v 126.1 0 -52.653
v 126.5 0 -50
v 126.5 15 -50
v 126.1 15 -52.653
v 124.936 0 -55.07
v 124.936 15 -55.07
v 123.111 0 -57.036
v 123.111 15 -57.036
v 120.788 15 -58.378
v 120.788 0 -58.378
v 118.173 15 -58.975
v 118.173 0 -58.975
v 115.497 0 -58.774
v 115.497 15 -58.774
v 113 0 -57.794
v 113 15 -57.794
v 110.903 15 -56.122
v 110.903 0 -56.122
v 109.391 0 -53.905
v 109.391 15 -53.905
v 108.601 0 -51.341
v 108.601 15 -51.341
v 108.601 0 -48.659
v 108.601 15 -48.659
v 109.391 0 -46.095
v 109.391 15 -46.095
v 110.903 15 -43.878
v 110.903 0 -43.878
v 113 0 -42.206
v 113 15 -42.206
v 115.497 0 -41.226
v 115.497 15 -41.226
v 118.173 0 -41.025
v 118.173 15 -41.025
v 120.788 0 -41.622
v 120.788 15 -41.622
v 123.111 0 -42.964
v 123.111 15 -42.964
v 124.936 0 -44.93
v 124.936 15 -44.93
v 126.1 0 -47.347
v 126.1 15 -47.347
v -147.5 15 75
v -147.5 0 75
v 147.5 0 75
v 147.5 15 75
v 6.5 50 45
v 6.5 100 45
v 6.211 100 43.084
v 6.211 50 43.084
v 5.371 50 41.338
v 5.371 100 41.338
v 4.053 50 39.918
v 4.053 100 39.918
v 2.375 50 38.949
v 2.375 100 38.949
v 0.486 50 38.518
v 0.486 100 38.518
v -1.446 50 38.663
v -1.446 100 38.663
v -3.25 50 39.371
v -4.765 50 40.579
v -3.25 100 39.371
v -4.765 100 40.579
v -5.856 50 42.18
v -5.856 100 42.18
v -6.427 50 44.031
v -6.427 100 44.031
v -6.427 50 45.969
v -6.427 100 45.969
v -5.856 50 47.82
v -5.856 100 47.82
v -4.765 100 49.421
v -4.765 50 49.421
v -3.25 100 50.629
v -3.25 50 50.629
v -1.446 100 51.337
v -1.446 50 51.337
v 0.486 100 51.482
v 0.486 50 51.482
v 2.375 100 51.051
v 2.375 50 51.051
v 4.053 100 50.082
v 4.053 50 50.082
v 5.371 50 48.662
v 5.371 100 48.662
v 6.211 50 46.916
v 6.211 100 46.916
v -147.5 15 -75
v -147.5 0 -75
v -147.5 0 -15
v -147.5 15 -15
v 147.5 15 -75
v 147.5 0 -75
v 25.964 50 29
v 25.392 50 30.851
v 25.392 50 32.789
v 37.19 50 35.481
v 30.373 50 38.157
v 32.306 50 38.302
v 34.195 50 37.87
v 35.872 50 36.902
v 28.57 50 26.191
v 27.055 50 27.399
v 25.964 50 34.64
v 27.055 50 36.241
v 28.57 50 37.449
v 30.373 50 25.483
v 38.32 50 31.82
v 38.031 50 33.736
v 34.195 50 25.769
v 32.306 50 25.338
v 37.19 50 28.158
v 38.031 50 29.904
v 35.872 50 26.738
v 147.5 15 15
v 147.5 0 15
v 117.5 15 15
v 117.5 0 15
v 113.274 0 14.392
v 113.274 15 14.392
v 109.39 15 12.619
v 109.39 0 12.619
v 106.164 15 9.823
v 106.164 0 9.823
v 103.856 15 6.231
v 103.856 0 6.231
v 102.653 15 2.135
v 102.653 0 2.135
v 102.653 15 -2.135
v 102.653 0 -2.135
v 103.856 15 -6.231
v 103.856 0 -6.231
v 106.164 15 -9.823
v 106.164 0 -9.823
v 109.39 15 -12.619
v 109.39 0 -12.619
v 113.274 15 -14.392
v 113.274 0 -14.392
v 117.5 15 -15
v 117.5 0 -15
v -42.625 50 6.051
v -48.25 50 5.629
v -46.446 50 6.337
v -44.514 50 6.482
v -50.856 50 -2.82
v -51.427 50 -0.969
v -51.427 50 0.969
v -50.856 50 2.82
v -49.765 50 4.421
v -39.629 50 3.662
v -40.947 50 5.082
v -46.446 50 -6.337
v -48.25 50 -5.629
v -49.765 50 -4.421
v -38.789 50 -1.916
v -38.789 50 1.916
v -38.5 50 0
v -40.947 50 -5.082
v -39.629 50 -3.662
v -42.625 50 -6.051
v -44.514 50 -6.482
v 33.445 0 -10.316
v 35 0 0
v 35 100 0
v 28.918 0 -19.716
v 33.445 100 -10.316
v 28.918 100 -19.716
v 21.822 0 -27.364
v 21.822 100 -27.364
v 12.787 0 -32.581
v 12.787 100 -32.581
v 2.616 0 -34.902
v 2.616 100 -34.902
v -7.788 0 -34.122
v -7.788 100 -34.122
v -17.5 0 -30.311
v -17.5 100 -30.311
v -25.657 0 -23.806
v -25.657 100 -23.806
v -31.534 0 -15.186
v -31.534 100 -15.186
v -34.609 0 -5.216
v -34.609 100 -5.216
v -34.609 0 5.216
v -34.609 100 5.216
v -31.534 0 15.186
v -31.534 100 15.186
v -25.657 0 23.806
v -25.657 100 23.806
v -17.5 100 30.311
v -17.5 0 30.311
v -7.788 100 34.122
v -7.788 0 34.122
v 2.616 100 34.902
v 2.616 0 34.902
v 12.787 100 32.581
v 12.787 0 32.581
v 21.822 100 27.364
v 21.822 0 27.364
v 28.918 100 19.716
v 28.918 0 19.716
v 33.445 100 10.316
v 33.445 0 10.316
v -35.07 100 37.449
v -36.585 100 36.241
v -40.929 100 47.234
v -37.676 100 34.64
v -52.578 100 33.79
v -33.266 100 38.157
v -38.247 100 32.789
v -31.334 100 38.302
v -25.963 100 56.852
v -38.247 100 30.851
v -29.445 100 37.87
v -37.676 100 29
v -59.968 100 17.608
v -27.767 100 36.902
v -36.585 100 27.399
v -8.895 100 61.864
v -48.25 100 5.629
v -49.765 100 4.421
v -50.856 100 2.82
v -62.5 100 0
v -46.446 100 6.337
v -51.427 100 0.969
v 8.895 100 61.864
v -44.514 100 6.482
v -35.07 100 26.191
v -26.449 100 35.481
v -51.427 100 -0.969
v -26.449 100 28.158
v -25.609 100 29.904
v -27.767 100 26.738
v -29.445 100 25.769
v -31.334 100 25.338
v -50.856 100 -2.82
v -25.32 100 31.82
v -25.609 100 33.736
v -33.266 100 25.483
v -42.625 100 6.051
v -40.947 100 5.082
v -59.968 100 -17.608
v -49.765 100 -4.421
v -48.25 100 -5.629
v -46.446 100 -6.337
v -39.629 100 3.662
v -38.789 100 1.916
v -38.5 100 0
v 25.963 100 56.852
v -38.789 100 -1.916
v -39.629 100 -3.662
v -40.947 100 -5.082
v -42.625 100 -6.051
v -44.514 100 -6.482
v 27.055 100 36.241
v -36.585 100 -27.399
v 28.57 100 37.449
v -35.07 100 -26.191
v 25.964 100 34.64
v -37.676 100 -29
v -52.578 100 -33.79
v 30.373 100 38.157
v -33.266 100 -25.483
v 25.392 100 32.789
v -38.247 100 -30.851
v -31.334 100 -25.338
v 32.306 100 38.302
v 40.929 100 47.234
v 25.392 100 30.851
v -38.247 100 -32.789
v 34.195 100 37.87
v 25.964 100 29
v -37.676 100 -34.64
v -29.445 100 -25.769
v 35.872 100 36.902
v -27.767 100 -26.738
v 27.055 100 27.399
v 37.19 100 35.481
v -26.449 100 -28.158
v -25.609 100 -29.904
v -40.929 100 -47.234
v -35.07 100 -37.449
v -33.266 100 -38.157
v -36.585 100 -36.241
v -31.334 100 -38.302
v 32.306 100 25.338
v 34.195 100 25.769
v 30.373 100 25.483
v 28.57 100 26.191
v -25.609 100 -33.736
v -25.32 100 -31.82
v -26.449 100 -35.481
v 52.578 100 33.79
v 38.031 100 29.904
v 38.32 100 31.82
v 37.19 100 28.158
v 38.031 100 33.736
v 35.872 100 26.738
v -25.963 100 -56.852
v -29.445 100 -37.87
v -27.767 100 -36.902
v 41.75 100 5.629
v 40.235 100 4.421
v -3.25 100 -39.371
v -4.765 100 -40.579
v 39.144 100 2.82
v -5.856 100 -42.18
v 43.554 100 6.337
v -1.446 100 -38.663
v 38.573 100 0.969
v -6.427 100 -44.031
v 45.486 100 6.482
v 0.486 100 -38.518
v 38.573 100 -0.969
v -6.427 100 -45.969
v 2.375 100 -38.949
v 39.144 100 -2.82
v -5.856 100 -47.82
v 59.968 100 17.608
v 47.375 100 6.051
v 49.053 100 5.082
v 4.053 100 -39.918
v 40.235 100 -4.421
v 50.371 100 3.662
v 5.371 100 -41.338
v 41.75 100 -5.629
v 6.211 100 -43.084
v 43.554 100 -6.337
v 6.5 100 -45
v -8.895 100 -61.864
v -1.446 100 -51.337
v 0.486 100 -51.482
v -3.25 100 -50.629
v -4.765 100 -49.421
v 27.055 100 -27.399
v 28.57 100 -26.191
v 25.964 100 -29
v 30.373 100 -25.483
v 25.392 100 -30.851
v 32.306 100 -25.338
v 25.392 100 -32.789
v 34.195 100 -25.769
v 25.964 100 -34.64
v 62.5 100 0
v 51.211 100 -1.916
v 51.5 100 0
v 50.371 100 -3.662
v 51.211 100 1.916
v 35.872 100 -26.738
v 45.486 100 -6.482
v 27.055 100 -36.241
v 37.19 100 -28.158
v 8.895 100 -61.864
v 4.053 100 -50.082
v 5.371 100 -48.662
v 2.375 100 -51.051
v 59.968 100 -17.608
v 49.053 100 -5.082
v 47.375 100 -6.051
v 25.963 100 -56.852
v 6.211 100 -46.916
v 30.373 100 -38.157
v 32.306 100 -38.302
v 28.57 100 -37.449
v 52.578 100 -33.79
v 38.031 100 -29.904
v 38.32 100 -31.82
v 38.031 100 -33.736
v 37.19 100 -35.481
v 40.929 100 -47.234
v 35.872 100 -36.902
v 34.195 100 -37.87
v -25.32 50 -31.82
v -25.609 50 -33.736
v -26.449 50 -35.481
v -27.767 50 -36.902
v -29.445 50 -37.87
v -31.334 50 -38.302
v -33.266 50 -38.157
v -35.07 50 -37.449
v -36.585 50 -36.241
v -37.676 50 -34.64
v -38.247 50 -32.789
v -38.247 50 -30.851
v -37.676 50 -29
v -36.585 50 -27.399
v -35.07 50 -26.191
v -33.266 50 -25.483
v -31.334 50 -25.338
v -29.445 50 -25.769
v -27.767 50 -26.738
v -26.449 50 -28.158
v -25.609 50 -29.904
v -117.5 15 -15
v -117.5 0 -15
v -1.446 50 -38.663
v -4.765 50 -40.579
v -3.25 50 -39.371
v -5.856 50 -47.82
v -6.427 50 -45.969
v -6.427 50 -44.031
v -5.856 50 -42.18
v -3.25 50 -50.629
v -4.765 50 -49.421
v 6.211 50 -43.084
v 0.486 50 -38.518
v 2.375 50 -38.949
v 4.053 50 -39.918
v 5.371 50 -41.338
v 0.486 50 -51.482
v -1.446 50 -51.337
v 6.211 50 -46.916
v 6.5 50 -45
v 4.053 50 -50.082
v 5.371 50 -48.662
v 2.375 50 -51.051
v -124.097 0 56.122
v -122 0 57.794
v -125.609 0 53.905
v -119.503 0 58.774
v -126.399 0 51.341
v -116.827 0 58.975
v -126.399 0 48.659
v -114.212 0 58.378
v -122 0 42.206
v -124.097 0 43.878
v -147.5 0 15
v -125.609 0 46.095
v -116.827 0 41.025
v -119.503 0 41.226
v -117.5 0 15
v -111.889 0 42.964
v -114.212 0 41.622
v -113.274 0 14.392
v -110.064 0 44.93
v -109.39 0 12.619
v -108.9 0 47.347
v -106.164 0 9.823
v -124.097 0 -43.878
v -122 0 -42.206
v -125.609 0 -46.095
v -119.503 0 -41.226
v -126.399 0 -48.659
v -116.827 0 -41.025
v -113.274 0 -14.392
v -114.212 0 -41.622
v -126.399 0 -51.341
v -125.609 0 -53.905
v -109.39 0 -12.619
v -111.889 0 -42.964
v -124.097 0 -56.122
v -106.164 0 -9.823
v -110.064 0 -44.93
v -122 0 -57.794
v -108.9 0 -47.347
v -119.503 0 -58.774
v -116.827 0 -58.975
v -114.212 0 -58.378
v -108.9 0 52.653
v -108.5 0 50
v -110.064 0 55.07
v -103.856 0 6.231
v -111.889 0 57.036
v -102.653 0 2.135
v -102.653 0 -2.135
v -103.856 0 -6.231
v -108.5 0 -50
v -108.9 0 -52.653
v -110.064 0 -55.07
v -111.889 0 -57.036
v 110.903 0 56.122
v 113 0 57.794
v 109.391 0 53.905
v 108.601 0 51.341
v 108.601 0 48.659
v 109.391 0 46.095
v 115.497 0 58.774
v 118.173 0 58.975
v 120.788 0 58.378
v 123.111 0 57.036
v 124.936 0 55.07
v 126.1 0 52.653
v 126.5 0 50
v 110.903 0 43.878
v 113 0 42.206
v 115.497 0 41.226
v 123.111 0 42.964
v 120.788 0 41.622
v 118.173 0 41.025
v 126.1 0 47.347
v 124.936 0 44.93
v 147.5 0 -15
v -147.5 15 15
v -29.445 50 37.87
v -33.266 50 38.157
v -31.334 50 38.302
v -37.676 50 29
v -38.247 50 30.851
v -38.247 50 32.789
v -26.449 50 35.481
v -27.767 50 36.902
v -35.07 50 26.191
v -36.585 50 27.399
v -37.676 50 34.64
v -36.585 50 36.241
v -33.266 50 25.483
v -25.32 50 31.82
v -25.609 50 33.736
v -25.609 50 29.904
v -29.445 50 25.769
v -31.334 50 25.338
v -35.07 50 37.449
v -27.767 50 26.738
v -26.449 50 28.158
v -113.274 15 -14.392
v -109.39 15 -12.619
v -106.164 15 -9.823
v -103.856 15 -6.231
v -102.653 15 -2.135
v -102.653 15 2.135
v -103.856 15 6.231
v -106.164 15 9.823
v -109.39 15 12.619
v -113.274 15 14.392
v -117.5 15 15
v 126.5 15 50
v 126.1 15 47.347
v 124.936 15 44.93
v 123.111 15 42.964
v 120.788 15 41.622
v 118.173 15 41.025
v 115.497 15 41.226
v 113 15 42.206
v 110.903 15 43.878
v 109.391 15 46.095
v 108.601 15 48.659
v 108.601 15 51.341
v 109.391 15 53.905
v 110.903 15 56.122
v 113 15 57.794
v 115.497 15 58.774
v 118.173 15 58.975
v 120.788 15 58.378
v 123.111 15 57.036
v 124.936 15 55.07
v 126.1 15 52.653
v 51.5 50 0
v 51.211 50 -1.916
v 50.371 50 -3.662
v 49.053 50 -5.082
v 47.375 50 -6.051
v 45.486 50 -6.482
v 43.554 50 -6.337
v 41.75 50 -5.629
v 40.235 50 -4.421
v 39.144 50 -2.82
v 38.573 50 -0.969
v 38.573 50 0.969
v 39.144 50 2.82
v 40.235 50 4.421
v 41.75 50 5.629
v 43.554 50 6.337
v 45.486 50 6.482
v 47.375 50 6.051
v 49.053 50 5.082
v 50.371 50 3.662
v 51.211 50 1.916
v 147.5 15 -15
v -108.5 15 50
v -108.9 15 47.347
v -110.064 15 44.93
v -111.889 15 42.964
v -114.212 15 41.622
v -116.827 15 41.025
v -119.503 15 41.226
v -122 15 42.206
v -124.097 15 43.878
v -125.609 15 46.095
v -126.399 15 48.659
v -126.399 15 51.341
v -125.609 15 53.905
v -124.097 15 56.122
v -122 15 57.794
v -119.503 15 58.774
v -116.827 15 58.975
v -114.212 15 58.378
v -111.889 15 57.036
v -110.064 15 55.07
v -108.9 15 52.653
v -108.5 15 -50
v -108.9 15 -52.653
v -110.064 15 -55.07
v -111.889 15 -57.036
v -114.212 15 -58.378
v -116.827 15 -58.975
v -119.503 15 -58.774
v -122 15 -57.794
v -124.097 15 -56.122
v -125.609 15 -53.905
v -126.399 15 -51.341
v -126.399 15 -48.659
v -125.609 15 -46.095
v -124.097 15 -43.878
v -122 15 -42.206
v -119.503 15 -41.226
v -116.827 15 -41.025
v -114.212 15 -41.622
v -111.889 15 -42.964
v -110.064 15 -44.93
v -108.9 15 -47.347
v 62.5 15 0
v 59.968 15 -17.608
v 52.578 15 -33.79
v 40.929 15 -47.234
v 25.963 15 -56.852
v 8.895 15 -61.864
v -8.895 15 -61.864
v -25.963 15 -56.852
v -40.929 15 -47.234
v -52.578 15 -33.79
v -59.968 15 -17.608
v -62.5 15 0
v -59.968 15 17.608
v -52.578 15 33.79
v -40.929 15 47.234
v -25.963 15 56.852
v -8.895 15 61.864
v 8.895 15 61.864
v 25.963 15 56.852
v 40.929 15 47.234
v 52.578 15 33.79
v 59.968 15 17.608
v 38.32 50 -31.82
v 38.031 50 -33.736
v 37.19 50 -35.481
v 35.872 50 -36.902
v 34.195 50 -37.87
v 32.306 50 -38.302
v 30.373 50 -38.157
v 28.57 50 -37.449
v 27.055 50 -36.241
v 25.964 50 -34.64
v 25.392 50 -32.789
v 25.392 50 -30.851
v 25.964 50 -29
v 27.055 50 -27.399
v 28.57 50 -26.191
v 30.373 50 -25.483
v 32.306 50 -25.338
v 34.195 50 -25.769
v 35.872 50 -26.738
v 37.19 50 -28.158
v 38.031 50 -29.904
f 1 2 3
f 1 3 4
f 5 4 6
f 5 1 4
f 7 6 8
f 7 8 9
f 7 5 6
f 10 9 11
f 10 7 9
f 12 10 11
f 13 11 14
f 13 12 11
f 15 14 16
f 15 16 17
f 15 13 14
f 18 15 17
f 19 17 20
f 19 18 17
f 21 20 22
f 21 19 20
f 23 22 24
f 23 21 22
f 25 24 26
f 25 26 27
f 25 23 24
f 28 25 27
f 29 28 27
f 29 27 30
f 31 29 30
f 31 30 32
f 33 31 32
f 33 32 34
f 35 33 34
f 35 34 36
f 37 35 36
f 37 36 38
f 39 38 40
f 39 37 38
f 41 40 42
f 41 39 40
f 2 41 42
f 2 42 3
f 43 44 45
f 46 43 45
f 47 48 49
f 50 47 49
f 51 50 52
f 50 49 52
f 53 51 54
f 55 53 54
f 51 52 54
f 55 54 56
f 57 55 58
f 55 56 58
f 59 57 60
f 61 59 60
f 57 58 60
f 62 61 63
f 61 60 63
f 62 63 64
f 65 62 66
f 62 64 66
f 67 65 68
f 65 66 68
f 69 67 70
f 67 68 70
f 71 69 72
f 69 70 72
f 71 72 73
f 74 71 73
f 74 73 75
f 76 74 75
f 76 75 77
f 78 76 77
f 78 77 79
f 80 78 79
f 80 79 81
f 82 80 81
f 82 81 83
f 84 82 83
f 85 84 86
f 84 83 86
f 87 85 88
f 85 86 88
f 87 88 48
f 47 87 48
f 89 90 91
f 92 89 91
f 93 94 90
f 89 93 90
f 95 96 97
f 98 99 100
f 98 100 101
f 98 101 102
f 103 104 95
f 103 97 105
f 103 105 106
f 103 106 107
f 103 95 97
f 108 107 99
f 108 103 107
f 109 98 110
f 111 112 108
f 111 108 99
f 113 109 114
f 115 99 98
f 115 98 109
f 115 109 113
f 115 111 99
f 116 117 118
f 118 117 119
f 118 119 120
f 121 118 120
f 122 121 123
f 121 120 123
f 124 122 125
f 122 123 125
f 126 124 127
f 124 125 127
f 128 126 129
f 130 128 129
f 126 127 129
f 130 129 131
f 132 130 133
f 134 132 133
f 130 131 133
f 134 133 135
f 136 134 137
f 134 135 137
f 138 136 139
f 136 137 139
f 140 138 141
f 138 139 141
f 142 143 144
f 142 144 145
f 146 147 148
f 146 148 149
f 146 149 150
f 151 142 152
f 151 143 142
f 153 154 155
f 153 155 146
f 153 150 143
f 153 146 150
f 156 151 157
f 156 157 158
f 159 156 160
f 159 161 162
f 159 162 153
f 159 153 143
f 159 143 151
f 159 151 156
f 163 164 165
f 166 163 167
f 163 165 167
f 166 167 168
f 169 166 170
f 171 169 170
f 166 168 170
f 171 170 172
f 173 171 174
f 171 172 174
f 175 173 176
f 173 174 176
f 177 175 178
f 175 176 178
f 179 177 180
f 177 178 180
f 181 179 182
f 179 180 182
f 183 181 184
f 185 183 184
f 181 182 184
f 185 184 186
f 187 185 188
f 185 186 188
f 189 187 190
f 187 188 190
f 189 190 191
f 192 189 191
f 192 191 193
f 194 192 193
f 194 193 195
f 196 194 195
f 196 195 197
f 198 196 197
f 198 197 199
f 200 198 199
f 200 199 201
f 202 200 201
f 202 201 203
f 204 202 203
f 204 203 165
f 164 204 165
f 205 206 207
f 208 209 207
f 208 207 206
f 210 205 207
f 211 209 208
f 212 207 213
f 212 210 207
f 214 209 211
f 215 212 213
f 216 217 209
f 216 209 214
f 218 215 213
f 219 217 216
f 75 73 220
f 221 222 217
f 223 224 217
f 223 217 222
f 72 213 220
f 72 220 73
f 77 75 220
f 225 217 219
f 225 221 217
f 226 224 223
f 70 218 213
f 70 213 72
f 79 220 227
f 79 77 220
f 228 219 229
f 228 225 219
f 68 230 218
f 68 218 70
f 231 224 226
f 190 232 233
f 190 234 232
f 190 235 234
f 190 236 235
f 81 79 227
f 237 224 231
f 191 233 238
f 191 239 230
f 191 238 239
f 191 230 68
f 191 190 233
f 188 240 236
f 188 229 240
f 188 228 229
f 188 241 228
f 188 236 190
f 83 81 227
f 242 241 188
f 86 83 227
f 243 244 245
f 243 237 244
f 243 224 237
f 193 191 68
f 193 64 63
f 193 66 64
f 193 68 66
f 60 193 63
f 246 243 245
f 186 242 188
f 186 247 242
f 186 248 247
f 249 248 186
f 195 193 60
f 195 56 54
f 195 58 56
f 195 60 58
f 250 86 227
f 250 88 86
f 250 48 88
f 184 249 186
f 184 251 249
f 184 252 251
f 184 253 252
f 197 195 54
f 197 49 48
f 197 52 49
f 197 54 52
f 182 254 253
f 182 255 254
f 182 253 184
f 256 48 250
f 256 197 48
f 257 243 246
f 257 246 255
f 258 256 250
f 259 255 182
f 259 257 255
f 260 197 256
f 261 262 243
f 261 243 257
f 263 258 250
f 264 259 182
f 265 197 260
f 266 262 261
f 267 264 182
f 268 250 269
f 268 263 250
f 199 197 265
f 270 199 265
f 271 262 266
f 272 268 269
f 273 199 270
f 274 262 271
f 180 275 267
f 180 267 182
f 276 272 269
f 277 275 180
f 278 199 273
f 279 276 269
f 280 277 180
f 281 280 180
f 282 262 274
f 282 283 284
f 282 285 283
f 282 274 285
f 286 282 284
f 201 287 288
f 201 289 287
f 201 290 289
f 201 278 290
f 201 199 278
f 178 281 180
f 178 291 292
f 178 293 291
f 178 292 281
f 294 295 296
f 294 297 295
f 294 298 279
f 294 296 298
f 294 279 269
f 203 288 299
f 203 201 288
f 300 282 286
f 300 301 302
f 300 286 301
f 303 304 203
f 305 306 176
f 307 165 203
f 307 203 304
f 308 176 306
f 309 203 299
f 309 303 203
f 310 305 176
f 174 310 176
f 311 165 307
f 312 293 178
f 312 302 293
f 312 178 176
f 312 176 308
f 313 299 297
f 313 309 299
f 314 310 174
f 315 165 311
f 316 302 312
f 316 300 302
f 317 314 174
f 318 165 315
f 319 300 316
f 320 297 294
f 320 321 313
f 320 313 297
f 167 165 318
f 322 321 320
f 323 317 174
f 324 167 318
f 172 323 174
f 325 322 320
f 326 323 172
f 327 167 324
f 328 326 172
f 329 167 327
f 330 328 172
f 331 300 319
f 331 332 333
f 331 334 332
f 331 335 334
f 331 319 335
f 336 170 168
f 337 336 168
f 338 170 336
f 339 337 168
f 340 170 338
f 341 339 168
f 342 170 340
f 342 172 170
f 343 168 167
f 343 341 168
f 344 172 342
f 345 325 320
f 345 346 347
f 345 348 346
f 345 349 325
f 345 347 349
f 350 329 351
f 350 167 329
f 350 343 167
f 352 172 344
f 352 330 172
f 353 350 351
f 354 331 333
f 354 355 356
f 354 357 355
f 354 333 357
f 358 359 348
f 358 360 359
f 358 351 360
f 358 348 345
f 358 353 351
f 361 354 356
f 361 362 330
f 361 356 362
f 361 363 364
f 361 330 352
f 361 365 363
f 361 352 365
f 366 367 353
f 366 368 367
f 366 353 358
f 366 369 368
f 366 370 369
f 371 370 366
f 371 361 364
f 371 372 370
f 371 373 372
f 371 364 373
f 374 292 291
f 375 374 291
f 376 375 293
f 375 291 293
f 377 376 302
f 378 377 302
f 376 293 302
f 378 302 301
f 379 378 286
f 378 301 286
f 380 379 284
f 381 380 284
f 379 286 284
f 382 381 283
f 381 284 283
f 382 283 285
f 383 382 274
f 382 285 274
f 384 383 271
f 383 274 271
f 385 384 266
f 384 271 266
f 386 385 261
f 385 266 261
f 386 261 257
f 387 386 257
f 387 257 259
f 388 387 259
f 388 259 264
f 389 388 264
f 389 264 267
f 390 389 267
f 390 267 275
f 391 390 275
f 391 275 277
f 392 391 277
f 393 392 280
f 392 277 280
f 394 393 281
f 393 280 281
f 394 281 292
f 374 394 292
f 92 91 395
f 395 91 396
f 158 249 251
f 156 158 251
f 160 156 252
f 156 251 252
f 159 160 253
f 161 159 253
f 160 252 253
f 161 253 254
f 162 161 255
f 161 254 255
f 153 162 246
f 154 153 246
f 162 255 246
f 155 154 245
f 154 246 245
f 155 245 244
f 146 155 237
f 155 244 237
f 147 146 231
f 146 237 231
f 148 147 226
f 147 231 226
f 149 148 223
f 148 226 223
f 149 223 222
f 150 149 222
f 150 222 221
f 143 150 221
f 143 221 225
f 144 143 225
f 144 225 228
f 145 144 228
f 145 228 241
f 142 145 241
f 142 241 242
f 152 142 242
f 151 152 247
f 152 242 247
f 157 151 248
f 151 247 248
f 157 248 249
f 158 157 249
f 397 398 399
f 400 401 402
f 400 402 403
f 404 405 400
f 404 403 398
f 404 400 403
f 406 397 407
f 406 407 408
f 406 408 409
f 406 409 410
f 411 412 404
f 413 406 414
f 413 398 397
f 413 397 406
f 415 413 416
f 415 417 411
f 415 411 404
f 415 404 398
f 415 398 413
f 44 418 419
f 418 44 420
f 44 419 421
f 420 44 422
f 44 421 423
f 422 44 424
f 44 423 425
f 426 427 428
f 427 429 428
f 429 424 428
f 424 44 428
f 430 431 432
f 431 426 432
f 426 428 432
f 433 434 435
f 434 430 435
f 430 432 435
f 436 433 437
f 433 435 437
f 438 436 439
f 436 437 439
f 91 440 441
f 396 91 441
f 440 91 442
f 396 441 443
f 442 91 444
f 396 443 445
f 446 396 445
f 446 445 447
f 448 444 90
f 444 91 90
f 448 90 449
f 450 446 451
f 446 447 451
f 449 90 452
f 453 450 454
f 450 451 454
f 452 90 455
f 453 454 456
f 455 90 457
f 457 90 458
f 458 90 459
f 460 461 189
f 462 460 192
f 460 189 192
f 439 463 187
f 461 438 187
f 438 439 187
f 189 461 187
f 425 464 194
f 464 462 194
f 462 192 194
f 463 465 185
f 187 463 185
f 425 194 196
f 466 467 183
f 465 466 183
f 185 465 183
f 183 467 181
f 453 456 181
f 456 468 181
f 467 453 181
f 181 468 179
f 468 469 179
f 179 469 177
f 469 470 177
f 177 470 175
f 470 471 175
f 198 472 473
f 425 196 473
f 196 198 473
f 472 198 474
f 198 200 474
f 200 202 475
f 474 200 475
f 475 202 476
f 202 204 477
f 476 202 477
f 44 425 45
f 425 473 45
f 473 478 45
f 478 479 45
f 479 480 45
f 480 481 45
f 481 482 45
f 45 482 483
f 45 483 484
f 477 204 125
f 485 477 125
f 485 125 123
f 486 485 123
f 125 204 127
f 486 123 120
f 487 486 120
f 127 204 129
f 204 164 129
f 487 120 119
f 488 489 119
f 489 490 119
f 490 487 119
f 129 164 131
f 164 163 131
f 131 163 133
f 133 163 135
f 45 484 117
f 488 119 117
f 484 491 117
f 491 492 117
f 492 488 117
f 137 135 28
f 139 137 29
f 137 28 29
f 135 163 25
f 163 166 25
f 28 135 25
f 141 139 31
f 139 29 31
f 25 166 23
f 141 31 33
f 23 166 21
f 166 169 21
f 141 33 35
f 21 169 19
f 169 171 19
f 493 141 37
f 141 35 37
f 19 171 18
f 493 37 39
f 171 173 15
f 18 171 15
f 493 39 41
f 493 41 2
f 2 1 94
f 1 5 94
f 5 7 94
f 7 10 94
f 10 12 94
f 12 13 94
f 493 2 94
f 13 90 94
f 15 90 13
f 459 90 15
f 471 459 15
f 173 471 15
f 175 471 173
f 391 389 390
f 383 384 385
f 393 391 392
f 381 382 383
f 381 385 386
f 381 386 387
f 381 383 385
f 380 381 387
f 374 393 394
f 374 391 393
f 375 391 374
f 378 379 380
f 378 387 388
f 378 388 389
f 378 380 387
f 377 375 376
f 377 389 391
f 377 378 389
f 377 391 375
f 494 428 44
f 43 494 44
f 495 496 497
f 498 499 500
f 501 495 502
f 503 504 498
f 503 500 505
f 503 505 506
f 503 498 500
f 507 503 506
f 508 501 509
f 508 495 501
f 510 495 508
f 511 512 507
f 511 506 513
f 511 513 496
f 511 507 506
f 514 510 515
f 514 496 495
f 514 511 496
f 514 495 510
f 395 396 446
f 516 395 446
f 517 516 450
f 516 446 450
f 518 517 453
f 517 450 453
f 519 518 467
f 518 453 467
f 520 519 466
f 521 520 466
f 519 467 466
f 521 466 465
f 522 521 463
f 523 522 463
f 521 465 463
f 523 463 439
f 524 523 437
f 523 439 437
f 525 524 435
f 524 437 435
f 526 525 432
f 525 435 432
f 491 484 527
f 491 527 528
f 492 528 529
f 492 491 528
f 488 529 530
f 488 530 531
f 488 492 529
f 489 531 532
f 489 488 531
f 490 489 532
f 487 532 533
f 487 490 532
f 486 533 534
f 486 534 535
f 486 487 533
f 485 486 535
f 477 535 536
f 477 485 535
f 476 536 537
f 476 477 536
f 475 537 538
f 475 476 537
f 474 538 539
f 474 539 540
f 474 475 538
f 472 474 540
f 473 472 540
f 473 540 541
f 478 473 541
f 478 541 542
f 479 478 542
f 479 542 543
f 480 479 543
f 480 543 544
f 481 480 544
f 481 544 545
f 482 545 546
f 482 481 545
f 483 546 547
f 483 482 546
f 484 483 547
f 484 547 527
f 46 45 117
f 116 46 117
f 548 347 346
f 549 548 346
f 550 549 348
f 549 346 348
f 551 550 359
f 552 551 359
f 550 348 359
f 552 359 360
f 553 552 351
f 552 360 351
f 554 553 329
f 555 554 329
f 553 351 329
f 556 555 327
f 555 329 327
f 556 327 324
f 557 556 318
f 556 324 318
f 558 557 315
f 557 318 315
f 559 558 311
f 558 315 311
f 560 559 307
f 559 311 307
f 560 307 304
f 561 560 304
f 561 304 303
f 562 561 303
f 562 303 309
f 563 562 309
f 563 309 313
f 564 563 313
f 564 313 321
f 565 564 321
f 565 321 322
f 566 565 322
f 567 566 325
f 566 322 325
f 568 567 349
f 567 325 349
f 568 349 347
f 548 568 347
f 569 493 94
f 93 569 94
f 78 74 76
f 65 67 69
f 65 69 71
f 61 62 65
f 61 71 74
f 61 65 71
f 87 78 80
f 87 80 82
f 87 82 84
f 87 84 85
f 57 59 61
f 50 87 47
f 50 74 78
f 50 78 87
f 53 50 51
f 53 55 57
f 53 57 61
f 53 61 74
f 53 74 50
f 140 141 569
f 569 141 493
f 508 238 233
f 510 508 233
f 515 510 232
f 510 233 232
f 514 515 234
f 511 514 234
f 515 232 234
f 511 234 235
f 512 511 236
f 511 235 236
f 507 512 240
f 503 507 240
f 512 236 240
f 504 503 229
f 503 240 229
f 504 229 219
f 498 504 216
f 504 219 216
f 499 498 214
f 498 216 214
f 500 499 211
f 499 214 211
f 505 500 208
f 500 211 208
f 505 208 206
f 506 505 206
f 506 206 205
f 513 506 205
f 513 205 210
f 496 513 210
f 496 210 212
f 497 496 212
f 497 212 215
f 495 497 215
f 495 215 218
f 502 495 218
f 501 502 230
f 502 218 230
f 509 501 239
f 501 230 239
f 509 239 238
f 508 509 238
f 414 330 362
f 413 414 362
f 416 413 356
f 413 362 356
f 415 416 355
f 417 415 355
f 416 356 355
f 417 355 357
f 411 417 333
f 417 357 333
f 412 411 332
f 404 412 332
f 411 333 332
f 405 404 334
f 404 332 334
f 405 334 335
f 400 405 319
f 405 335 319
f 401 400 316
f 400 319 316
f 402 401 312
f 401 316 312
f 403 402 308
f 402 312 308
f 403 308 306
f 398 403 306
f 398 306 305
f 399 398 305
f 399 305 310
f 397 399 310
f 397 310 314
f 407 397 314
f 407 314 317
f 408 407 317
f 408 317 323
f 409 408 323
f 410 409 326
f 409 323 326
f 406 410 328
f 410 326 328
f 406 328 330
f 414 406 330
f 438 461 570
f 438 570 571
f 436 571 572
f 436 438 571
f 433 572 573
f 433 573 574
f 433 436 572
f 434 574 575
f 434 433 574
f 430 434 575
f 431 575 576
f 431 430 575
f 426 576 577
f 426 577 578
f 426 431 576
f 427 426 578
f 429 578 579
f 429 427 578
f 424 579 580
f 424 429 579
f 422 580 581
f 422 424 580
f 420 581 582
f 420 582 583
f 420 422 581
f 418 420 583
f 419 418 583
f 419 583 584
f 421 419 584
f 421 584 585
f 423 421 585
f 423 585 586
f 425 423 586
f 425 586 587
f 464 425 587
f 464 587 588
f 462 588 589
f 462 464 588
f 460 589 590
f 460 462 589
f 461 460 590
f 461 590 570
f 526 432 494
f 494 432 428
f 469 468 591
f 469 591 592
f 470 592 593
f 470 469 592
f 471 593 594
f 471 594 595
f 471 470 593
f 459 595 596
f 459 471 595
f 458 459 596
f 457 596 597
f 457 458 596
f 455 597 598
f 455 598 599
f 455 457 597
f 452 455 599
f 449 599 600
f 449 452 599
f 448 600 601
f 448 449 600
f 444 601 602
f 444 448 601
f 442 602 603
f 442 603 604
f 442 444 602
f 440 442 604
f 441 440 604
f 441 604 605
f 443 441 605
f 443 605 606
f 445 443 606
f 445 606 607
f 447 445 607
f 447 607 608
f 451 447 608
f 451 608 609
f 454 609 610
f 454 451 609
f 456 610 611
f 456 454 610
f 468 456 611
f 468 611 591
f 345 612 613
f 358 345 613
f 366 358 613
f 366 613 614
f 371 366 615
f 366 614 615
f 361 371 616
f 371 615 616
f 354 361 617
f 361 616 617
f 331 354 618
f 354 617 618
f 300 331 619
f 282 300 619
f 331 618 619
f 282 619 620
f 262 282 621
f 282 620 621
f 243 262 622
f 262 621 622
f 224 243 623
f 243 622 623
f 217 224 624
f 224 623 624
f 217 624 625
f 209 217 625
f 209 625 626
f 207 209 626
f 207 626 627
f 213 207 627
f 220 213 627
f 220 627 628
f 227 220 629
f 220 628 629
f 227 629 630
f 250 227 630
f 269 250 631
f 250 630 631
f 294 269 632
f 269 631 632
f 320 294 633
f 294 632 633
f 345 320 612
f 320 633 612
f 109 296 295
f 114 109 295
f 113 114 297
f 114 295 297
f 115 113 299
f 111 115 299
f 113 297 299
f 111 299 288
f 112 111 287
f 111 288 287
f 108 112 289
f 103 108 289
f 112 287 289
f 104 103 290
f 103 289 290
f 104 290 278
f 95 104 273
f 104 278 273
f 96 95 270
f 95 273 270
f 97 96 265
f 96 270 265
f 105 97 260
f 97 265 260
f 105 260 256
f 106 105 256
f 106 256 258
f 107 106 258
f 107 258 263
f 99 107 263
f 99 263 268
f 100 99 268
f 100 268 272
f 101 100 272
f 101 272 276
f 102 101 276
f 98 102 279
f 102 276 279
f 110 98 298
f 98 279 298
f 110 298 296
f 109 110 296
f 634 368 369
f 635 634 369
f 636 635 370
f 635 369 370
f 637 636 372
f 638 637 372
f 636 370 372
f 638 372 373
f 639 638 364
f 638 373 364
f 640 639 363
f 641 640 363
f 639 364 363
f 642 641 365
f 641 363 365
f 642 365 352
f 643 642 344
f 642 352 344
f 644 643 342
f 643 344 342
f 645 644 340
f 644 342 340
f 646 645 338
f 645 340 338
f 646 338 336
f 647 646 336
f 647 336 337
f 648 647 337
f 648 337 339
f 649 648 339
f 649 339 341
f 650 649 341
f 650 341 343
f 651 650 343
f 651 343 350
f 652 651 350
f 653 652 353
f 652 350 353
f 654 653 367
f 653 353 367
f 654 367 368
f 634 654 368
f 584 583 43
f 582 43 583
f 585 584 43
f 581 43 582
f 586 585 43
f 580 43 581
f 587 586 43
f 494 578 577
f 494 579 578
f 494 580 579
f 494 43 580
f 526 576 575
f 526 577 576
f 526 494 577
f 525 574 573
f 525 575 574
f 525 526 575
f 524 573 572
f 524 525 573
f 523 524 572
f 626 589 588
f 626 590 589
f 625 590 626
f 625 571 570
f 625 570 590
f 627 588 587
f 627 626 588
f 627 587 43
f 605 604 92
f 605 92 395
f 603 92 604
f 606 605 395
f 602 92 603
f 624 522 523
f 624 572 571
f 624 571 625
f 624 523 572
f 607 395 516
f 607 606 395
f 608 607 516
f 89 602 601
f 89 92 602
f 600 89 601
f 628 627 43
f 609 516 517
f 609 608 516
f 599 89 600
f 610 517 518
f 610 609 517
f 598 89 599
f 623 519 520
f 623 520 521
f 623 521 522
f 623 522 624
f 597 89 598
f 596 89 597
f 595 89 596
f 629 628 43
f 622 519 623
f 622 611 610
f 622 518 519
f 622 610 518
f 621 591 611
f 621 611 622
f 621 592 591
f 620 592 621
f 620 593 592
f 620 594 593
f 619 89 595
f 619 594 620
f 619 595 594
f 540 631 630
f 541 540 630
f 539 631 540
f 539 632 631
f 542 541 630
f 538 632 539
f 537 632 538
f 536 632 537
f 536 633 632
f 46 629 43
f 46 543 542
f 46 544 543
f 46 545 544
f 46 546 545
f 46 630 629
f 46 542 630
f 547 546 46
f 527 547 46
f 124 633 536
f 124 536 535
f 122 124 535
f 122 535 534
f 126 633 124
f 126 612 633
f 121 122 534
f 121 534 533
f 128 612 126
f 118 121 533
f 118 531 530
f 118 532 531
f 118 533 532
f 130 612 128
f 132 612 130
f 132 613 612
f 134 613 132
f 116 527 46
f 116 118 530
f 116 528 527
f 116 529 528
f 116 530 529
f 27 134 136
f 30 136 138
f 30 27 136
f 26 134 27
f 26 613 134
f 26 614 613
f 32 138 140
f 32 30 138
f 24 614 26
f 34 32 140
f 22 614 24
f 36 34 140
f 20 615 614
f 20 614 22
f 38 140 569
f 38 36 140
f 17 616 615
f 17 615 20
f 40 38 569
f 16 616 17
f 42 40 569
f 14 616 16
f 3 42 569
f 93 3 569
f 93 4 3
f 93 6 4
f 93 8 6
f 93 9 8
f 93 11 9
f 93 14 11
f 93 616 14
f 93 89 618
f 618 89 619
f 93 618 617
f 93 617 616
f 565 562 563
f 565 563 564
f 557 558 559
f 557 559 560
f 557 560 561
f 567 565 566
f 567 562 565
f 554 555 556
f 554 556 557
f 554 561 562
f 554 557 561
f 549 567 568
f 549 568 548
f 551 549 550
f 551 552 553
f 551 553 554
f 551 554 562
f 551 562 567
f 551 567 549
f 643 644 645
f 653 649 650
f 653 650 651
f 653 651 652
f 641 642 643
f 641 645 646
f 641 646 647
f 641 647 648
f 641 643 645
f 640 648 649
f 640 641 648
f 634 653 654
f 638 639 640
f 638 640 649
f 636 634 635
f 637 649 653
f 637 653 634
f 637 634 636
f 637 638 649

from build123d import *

# Parameters (mm, degrees)
SKETCH1_R           = 9
BOSS_EXTRUDE1_DEPTH = 15
SKETCH2_R           = 62.5
BOSS_EXTRUDE2_DEPTH = 85
SKETCH3_R           = 35
CUT_EXTRUDE1_DEPTH  = 101
SKETCH4_R           = 6.5
CUT_EXTRUDE2_DEPTH  = 50


with BuildPart() as part:
    # Sketch1 → Boss-Extrude1 (new body)
    with BuildSketch(Plane(origin=(0, 0, 0), x_dir=(1, 0, 0), z_dir=(0, 1, 0))):
        with BuildLine():
            Line((-147.5, -15), (-147.5, -75))
            Line((-147.5, -75), (147.5, -75))
            Line((147.5, -75), (147.5, -15))
            Line((147.5, -15), (117.5, -15))
            ThreePointArc((117.5, -15), (102.5, 0), (117.5, 15))
            Line((117.5, 15), (147.5, 15))
            Line((147.5, 15), (147.5, 75))
            Line((147.5, 75), (-147.5, 75))
            Line((-147.5, 75), (-147.5, 15))
            Line((-147.5, 15), (-117.5, 15))
            ThreePointArc((-117.5, 15), (-102.5, 0), (-117.5, -15))
            Line((-117.5, -15), (-147.5, -15))
        make_face()
        with Locations((-117.5, -50)):
            Circle(SKETCH1_R, mode=Mode.SUBTRACT)
        with Locations((117.5, -50)):
            Circle(SKETCH1_R, mode=Mode.SUBTRACT)
        with Locations((-117.5, 50)):
            Circle(SKETCH1_R, mode=Mode.SUBTRACT)
        with Locations((117.5, 50)):
            Circle(SKETCH1_R, mode=Mode.SUBTRACT)
    extrude(amount=BOSS_EXTRUDE1_DEPTH)

    # Sketch2 → Boss-Extrude2 (add)
    with BuildSketch(Plane(origin=(0, 15, 0), x_dir=(1, 0, 0), z_dir=(0, 1, 0))):
        Circle(SKETCH2_R)
    extrude(amount=BOSS_EXTRUDE2_DEPTH)

    # Sketch3 → Cut-Extrude1 (cut, through all)
    with BuildSketch(Plane(origin=(0, 100, 0), x_dir=(1, 0, 0), z_dir=(0, 1, 0))):
        Circle(SKETCH3_R)
    extrude(amount=-CUT_EXTRUDE1_DEPTH, mode=Mode.SUBTRACT)

    # Sketch4 → Cut-Extrude2 (cut)
    with BuildSketch(Plane(origin=(0, 100, 0), x_dir=(1, 0, 0), z_dir=(0, 1, 0))):
        with Locations((-45, 0)):
            Circle(SKETCH4_R)
        with Locations((-31.819805153, 31.819805153)):
            Circle(SKETCH4_R)
        with Locations((0, 45)):
            Circle(SKETCH4_R)
        with Locations((31.819805153, 31.819805153)):
            Circle(SKETCH4_R)
        with Locations((45, 0)):
            Circle(SKETCH4_R)
        with Locations((31.819805153, -31.819805153)):
            Circle(SKETCH4_R)
        with Locations((0, -45)):
            Circle(SKETCH4_R)
        with Locations((-31.819805153, -31.819805153)):
            Circle(SKETCH4_R)
    extrude(amount=-CUT_EXTRUDE2_DEPTH, mode=Mode.SUBTRACT)


solid = part.part
